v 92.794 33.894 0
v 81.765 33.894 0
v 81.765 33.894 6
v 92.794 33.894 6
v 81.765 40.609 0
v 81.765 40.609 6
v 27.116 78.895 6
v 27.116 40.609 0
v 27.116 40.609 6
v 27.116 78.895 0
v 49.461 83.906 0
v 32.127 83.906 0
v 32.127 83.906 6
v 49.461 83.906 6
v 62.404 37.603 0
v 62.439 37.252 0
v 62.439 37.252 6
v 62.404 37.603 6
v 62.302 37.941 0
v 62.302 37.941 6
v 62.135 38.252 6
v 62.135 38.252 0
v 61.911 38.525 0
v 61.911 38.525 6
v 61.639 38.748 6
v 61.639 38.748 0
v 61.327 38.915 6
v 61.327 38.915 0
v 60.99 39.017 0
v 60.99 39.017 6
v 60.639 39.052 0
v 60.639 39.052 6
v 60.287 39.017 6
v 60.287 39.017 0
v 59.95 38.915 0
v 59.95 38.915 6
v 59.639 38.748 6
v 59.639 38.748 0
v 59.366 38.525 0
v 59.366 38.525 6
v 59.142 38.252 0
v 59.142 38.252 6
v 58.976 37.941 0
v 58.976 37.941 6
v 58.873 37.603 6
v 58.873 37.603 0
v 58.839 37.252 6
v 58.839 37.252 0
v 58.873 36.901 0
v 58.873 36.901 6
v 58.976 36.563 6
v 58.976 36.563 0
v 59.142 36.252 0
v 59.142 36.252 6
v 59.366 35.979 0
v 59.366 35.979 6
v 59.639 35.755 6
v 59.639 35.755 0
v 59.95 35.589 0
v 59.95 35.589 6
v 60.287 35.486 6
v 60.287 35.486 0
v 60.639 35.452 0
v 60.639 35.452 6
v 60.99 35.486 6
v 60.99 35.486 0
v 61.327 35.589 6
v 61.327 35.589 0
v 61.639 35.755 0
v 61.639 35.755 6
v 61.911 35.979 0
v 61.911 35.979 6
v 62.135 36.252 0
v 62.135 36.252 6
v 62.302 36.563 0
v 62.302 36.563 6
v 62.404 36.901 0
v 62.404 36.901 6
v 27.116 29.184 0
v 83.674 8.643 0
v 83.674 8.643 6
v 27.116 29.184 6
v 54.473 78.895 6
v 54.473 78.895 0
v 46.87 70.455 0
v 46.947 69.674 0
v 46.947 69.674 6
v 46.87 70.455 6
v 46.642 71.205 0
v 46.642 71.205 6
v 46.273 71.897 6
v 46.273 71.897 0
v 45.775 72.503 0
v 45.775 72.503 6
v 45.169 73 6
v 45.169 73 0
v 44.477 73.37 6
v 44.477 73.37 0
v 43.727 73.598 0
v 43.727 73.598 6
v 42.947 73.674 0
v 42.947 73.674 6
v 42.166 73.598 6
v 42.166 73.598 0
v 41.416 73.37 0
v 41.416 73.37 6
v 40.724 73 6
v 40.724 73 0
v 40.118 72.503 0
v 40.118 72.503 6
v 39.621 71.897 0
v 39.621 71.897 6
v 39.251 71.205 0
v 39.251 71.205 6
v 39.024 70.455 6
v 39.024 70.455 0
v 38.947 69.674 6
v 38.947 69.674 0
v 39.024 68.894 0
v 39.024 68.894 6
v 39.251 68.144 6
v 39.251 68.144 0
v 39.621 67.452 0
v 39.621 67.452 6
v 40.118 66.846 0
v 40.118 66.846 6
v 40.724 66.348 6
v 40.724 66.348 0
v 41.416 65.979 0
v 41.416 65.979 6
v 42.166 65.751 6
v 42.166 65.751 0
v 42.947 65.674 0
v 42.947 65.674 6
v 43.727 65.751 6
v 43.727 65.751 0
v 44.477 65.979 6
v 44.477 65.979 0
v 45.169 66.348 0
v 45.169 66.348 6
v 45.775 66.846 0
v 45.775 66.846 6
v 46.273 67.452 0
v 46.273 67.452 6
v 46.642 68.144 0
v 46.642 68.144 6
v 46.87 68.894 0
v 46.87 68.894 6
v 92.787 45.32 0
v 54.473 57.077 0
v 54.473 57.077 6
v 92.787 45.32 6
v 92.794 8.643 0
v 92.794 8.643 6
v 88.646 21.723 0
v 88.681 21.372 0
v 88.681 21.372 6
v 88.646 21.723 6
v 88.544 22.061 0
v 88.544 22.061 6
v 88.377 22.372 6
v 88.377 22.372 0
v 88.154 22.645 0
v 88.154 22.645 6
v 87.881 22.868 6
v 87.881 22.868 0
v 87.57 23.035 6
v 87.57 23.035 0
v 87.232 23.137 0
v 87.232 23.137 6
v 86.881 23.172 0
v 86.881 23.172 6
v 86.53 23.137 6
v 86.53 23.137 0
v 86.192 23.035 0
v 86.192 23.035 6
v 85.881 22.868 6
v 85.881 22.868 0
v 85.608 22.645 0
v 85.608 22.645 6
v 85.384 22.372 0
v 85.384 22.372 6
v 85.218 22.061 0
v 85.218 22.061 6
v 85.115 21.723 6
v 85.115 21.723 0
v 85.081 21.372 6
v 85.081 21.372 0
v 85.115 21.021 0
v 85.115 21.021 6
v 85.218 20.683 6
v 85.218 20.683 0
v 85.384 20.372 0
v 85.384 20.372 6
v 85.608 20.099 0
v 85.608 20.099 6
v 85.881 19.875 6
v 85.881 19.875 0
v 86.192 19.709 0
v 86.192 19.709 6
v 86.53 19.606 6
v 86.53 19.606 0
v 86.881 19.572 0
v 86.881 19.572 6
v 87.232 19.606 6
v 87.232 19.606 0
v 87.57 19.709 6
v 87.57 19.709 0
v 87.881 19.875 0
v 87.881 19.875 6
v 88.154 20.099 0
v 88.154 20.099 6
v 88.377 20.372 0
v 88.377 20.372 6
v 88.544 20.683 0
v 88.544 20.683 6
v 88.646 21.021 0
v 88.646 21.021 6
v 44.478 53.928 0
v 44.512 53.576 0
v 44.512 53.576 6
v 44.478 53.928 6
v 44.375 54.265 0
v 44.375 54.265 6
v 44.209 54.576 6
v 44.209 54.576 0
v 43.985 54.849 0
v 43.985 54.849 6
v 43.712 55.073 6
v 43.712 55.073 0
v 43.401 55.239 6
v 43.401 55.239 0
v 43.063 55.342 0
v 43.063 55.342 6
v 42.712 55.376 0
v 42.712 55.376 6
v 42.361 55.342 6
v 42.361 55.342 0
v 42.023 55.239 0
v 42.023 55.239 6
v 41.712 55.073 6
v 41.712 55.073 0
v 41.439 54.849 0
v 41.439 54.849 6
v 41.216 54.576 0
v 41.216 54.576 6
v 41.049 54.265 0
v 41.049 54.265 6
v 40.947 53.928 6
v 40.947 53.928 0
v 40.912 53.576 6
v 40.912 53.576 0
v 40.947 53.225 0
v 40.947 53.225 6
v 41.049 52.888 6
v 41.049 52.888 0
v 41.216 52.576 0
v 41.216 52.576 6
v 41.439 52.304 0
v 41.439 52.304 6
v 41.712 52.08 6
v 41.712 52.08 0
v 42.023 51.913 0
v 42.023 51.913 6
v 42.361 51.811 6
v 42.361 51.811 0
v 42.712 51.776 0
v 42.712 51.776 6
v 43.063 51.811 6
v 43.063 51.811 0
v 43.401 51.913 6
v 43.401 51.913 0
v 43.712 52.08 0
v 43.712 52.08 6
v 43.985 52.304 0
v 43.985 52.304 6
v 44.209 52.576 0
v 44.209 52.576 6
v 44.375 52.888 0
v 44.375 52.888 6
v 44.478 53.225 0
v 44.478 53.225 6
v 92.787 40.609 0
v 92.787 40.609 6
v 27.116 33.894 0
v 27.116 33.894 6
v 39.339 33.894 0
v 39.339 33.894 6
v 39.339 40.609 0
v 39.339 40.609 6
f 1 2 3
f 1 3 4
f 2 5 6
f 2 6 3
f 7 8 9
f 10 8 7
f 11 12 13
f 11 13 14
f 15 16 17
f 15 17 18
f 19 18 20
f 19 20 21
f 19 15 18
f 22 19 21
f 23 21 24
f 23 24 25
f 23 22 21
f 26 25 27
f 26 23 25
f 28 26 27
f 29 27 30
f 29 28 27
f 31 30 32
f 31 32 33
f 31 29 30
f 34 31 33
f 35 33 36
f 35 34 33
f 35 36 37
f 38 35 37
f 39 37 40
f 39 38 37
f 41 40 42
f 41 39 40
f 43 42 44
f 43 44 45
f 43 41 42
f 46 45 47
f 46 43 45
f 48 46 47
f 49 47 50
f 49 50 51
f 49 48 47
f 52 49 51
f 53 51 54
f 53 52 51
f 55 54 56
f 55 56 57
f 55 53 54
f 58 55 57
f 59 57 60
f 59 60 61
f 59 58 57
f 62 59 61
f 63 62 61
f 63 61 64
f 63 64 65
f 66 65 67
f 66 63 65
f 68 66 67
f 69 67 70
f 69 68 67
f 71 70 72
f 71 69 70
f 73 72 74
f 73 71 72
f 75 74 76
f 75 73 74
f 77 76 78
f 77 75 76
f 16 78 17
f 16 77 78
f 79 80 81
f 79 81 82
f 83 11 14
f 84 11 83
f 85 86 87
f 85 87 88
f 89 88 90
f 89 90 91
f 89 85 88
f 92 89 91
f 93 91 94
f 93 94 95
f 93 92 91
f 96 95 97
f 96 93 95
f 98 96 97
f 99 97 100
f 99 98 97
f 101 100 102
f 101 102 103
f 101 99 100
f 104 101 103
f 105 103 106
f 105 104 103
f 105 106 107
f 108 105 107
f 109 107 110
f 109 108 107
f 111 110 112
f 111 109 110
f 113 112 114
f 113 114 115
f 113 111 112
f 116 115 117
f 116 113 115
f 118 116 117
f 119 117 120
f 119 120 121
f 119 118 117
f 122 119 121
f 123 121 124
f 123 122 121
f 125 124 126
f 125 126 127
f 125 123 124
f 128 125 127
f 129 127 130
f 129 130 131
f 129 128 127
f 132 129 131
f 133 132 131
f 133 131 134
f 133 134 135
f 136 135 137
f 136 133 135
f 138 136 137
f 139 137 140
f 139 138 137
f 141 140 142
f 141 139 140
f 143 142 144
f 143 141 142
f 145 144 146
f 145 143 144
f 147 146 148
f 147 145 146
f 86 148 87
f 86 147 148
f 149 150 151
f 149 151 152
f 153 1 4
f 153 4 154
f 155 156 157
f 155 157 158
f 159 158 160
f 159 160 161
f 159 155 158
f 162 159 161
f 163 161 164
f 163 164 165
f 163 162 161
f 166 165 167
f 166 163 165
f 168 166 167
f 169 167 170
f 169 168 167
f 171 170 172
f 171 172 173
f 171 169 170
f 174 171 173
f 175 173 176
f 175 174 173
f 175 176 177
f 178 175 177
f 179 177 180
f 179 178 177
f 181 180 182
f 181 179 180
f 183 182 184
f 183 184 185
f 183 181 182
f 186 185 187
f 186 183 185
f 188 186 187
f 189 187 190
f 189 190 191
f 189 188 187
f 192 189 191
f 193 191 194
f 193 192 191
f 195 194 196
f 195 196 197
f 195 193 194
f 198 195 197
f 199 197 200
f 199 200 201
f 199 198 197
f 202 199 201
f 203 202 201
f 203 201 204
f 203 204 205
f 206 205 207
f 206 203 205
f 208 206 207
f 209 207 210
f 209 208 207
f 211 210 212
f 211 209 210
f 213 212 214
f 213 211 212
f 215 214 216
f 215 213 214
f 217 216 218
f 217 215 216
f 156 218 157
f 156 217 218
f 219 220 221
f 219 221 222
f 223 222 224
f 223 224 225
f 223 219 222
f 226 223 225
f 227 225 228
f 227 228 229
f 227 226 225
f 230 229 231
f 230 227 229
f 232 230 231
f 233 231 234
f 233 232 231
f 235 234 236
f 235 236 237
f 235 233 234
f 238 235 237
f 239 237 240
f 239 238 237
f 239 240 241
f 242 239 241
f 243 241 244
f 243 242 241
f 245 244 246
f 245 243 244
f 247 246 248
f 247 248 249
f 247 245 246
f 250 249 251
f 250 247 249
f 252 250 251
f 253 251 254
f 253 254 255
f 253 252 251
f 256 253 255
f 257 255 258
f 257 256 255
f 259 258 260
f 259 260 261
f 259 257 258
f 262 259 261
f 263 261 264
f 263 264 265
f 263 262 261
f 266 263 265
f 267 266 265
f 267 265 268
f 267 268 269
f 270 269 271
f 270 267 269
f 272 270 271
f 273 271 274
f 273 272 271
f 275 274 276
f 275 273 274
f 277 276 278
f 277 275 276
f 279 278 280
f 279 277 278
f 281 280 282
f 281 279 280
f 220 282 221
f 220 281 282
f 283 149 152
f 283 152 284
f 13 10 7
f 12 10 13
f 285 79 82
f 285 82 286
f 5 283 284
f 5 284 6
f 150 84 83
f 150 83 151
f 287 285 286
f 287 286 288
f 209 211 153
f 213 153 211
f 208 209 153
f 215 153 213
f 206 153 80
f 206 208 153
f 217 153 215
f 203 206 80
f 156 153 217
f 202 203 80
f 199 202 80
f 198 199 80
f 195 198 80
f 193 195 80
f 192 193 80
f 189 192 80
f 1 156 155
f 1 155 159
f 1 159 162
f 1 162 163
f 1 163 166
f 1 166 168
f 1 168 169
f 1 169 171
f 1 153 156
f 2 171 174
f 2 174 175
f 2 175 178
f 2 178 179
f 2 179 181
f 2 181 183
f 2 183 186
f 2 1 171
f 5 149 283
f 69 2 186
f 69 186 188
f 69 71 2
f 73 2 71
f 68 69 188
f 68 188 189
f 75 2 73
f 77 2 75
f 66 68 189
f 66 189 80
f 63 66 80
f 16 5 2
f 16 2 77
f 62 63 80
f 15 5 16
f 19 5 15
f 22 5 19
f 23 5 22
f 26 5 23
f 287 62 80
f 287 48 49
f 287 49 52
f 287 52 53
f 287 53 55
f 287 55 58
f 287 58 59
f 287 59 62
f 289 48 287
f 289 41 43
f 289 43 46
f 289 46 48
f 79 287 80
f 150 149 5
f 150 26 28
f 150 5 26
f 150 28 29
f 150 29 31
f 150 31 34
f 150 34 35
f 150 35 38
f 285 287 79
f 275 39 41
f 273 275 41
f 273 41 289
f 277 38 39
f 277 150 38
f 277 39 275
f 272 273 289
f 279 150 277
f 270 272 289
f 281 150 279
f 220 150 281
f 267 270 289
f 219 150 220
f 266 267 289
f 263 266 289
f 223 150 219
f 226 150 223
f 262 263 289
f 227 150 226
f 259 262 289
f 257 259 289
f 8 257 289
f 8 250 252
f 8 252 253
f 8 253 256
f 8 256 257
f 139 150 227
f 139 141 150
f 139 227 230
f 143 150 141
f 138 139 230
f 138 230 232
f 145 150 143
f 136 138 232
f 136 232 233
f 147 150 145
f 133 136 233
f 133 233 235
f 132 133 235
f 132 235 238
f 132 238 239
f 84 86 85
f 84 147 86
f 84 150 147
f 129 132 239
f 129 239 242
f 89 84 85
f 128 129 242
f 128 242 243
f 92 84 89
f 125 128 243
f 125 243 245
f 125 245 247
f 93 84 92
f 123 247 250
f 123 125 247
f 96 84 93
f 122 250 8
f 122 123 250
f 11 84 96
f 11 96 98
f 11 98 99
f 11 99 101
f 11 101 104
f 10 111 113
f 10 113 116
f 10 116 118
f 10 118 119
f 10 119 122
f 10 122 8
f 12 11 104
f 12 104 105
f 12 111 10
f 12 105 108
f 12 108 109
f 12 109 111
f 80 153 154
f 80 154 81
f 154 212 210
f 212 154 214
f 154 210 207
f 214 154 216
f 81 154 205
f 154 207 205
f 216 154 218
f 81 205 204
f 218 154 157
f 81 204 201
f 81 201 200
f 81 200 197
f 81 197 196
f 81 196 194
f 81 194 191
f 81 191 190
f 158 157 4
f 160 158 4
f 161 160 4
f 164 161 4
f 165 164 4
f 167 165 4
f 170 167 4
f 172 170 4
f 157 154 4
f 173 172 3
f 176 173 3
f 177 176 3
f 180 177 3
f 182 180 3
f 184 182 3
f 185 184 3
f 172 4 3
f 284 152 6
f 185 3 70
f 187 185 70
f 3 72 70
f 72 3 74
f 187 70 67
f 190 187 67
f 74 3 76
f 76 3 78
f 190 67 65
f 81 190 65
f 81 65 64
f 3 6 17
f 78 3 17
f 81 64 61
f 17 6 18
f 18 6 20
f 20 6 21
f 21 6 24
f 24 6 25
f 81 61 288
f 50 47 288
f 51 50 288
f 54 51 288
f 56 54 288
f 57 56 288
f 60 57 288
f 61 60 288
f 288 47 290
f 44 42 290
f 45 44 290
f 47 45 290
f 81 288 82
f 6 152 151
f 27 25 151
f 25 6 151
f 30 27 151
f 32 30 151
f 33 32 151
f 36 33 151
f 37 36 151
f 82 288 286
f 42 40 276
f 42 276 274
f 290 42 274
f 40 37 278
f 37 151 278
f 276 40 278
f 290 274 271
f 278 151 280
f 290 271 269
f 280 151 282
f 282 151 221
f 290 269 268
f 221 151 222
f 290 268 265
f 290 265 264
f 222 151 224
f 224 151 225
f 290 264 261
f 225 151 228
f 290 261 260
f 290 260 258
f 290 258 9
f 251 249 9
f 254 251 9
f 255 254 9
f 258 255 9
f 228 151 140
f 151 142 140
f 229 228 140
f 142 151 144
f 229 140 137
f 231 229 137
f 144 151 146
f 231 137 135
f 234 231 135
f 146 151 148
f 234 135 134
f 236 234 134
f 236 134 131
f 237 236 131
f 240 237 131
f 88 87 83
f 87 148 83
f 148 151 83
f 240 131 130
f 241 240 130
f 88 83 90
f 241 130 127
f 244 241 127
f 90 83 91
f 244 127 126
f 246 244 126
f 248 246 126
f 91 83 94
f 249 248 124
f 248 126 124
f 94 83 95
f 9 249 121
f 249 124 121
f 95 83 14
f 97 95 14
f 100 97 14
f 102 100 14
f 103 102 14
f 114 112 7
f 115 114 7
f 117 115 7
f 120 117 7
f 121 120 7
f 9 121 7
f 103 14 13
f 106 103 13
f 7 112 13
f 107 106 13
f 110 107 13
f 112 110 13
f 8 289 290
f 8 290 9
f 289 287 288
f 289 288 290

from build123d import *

# Parameters (mm, degrees)
MODEL_R                  = 1.8
MODEL_R_2                = 4
RESSALTO_EXTRUS_O1_DEPTH = 6


with BuildPart() as part:
    # Model → Ressalto-extrusão1 (new body)
    with BuildSketch(Plane.XY):
        Polygon((39.338603549, 33.894434028), (39.338603549, 40.60903008), (27.115699134, 40.60903008), (27.115699127, 78.895034597), (32.12692686, 83.90626233), (49.461276894, 83.906262358), (54.472504627, 78.895034645), (54.472504634, 57.076803542), (92.787264171, 45.319808703), (92.787264171, 40.60903008), (81.764808786, 40.60903008), (81.764808786, 33.894434028), (92.79400105, 33.894434035), (92.79400105, 8.643266236), (83.673566577, 8.643266228), (27.115699134, 29.183655407), (27.115699134, 33.894434028), align=None)
        with Locations((86.880751581, 21.371784671)):
            Circle(MODEL_R, mode=Mode.SUBTRACT)
        with Locations((60.638601845, 37.251732042)):
            Circle(MODEL_R, mode=Mode.SUBTRACT)
        with Locations((42.712190227, 53.576442757)):
            Circle(MODEL_R, mode=Mode.SUBTRACT)
        with Locations((42.946680849, 69.67437556)):
            Circle(MODEL_R_2, mode=Mode.SUBTRACT)
    extrude(amount=RESSALTO_EXTRUS_O1_DEPTH)


solid = part.part
